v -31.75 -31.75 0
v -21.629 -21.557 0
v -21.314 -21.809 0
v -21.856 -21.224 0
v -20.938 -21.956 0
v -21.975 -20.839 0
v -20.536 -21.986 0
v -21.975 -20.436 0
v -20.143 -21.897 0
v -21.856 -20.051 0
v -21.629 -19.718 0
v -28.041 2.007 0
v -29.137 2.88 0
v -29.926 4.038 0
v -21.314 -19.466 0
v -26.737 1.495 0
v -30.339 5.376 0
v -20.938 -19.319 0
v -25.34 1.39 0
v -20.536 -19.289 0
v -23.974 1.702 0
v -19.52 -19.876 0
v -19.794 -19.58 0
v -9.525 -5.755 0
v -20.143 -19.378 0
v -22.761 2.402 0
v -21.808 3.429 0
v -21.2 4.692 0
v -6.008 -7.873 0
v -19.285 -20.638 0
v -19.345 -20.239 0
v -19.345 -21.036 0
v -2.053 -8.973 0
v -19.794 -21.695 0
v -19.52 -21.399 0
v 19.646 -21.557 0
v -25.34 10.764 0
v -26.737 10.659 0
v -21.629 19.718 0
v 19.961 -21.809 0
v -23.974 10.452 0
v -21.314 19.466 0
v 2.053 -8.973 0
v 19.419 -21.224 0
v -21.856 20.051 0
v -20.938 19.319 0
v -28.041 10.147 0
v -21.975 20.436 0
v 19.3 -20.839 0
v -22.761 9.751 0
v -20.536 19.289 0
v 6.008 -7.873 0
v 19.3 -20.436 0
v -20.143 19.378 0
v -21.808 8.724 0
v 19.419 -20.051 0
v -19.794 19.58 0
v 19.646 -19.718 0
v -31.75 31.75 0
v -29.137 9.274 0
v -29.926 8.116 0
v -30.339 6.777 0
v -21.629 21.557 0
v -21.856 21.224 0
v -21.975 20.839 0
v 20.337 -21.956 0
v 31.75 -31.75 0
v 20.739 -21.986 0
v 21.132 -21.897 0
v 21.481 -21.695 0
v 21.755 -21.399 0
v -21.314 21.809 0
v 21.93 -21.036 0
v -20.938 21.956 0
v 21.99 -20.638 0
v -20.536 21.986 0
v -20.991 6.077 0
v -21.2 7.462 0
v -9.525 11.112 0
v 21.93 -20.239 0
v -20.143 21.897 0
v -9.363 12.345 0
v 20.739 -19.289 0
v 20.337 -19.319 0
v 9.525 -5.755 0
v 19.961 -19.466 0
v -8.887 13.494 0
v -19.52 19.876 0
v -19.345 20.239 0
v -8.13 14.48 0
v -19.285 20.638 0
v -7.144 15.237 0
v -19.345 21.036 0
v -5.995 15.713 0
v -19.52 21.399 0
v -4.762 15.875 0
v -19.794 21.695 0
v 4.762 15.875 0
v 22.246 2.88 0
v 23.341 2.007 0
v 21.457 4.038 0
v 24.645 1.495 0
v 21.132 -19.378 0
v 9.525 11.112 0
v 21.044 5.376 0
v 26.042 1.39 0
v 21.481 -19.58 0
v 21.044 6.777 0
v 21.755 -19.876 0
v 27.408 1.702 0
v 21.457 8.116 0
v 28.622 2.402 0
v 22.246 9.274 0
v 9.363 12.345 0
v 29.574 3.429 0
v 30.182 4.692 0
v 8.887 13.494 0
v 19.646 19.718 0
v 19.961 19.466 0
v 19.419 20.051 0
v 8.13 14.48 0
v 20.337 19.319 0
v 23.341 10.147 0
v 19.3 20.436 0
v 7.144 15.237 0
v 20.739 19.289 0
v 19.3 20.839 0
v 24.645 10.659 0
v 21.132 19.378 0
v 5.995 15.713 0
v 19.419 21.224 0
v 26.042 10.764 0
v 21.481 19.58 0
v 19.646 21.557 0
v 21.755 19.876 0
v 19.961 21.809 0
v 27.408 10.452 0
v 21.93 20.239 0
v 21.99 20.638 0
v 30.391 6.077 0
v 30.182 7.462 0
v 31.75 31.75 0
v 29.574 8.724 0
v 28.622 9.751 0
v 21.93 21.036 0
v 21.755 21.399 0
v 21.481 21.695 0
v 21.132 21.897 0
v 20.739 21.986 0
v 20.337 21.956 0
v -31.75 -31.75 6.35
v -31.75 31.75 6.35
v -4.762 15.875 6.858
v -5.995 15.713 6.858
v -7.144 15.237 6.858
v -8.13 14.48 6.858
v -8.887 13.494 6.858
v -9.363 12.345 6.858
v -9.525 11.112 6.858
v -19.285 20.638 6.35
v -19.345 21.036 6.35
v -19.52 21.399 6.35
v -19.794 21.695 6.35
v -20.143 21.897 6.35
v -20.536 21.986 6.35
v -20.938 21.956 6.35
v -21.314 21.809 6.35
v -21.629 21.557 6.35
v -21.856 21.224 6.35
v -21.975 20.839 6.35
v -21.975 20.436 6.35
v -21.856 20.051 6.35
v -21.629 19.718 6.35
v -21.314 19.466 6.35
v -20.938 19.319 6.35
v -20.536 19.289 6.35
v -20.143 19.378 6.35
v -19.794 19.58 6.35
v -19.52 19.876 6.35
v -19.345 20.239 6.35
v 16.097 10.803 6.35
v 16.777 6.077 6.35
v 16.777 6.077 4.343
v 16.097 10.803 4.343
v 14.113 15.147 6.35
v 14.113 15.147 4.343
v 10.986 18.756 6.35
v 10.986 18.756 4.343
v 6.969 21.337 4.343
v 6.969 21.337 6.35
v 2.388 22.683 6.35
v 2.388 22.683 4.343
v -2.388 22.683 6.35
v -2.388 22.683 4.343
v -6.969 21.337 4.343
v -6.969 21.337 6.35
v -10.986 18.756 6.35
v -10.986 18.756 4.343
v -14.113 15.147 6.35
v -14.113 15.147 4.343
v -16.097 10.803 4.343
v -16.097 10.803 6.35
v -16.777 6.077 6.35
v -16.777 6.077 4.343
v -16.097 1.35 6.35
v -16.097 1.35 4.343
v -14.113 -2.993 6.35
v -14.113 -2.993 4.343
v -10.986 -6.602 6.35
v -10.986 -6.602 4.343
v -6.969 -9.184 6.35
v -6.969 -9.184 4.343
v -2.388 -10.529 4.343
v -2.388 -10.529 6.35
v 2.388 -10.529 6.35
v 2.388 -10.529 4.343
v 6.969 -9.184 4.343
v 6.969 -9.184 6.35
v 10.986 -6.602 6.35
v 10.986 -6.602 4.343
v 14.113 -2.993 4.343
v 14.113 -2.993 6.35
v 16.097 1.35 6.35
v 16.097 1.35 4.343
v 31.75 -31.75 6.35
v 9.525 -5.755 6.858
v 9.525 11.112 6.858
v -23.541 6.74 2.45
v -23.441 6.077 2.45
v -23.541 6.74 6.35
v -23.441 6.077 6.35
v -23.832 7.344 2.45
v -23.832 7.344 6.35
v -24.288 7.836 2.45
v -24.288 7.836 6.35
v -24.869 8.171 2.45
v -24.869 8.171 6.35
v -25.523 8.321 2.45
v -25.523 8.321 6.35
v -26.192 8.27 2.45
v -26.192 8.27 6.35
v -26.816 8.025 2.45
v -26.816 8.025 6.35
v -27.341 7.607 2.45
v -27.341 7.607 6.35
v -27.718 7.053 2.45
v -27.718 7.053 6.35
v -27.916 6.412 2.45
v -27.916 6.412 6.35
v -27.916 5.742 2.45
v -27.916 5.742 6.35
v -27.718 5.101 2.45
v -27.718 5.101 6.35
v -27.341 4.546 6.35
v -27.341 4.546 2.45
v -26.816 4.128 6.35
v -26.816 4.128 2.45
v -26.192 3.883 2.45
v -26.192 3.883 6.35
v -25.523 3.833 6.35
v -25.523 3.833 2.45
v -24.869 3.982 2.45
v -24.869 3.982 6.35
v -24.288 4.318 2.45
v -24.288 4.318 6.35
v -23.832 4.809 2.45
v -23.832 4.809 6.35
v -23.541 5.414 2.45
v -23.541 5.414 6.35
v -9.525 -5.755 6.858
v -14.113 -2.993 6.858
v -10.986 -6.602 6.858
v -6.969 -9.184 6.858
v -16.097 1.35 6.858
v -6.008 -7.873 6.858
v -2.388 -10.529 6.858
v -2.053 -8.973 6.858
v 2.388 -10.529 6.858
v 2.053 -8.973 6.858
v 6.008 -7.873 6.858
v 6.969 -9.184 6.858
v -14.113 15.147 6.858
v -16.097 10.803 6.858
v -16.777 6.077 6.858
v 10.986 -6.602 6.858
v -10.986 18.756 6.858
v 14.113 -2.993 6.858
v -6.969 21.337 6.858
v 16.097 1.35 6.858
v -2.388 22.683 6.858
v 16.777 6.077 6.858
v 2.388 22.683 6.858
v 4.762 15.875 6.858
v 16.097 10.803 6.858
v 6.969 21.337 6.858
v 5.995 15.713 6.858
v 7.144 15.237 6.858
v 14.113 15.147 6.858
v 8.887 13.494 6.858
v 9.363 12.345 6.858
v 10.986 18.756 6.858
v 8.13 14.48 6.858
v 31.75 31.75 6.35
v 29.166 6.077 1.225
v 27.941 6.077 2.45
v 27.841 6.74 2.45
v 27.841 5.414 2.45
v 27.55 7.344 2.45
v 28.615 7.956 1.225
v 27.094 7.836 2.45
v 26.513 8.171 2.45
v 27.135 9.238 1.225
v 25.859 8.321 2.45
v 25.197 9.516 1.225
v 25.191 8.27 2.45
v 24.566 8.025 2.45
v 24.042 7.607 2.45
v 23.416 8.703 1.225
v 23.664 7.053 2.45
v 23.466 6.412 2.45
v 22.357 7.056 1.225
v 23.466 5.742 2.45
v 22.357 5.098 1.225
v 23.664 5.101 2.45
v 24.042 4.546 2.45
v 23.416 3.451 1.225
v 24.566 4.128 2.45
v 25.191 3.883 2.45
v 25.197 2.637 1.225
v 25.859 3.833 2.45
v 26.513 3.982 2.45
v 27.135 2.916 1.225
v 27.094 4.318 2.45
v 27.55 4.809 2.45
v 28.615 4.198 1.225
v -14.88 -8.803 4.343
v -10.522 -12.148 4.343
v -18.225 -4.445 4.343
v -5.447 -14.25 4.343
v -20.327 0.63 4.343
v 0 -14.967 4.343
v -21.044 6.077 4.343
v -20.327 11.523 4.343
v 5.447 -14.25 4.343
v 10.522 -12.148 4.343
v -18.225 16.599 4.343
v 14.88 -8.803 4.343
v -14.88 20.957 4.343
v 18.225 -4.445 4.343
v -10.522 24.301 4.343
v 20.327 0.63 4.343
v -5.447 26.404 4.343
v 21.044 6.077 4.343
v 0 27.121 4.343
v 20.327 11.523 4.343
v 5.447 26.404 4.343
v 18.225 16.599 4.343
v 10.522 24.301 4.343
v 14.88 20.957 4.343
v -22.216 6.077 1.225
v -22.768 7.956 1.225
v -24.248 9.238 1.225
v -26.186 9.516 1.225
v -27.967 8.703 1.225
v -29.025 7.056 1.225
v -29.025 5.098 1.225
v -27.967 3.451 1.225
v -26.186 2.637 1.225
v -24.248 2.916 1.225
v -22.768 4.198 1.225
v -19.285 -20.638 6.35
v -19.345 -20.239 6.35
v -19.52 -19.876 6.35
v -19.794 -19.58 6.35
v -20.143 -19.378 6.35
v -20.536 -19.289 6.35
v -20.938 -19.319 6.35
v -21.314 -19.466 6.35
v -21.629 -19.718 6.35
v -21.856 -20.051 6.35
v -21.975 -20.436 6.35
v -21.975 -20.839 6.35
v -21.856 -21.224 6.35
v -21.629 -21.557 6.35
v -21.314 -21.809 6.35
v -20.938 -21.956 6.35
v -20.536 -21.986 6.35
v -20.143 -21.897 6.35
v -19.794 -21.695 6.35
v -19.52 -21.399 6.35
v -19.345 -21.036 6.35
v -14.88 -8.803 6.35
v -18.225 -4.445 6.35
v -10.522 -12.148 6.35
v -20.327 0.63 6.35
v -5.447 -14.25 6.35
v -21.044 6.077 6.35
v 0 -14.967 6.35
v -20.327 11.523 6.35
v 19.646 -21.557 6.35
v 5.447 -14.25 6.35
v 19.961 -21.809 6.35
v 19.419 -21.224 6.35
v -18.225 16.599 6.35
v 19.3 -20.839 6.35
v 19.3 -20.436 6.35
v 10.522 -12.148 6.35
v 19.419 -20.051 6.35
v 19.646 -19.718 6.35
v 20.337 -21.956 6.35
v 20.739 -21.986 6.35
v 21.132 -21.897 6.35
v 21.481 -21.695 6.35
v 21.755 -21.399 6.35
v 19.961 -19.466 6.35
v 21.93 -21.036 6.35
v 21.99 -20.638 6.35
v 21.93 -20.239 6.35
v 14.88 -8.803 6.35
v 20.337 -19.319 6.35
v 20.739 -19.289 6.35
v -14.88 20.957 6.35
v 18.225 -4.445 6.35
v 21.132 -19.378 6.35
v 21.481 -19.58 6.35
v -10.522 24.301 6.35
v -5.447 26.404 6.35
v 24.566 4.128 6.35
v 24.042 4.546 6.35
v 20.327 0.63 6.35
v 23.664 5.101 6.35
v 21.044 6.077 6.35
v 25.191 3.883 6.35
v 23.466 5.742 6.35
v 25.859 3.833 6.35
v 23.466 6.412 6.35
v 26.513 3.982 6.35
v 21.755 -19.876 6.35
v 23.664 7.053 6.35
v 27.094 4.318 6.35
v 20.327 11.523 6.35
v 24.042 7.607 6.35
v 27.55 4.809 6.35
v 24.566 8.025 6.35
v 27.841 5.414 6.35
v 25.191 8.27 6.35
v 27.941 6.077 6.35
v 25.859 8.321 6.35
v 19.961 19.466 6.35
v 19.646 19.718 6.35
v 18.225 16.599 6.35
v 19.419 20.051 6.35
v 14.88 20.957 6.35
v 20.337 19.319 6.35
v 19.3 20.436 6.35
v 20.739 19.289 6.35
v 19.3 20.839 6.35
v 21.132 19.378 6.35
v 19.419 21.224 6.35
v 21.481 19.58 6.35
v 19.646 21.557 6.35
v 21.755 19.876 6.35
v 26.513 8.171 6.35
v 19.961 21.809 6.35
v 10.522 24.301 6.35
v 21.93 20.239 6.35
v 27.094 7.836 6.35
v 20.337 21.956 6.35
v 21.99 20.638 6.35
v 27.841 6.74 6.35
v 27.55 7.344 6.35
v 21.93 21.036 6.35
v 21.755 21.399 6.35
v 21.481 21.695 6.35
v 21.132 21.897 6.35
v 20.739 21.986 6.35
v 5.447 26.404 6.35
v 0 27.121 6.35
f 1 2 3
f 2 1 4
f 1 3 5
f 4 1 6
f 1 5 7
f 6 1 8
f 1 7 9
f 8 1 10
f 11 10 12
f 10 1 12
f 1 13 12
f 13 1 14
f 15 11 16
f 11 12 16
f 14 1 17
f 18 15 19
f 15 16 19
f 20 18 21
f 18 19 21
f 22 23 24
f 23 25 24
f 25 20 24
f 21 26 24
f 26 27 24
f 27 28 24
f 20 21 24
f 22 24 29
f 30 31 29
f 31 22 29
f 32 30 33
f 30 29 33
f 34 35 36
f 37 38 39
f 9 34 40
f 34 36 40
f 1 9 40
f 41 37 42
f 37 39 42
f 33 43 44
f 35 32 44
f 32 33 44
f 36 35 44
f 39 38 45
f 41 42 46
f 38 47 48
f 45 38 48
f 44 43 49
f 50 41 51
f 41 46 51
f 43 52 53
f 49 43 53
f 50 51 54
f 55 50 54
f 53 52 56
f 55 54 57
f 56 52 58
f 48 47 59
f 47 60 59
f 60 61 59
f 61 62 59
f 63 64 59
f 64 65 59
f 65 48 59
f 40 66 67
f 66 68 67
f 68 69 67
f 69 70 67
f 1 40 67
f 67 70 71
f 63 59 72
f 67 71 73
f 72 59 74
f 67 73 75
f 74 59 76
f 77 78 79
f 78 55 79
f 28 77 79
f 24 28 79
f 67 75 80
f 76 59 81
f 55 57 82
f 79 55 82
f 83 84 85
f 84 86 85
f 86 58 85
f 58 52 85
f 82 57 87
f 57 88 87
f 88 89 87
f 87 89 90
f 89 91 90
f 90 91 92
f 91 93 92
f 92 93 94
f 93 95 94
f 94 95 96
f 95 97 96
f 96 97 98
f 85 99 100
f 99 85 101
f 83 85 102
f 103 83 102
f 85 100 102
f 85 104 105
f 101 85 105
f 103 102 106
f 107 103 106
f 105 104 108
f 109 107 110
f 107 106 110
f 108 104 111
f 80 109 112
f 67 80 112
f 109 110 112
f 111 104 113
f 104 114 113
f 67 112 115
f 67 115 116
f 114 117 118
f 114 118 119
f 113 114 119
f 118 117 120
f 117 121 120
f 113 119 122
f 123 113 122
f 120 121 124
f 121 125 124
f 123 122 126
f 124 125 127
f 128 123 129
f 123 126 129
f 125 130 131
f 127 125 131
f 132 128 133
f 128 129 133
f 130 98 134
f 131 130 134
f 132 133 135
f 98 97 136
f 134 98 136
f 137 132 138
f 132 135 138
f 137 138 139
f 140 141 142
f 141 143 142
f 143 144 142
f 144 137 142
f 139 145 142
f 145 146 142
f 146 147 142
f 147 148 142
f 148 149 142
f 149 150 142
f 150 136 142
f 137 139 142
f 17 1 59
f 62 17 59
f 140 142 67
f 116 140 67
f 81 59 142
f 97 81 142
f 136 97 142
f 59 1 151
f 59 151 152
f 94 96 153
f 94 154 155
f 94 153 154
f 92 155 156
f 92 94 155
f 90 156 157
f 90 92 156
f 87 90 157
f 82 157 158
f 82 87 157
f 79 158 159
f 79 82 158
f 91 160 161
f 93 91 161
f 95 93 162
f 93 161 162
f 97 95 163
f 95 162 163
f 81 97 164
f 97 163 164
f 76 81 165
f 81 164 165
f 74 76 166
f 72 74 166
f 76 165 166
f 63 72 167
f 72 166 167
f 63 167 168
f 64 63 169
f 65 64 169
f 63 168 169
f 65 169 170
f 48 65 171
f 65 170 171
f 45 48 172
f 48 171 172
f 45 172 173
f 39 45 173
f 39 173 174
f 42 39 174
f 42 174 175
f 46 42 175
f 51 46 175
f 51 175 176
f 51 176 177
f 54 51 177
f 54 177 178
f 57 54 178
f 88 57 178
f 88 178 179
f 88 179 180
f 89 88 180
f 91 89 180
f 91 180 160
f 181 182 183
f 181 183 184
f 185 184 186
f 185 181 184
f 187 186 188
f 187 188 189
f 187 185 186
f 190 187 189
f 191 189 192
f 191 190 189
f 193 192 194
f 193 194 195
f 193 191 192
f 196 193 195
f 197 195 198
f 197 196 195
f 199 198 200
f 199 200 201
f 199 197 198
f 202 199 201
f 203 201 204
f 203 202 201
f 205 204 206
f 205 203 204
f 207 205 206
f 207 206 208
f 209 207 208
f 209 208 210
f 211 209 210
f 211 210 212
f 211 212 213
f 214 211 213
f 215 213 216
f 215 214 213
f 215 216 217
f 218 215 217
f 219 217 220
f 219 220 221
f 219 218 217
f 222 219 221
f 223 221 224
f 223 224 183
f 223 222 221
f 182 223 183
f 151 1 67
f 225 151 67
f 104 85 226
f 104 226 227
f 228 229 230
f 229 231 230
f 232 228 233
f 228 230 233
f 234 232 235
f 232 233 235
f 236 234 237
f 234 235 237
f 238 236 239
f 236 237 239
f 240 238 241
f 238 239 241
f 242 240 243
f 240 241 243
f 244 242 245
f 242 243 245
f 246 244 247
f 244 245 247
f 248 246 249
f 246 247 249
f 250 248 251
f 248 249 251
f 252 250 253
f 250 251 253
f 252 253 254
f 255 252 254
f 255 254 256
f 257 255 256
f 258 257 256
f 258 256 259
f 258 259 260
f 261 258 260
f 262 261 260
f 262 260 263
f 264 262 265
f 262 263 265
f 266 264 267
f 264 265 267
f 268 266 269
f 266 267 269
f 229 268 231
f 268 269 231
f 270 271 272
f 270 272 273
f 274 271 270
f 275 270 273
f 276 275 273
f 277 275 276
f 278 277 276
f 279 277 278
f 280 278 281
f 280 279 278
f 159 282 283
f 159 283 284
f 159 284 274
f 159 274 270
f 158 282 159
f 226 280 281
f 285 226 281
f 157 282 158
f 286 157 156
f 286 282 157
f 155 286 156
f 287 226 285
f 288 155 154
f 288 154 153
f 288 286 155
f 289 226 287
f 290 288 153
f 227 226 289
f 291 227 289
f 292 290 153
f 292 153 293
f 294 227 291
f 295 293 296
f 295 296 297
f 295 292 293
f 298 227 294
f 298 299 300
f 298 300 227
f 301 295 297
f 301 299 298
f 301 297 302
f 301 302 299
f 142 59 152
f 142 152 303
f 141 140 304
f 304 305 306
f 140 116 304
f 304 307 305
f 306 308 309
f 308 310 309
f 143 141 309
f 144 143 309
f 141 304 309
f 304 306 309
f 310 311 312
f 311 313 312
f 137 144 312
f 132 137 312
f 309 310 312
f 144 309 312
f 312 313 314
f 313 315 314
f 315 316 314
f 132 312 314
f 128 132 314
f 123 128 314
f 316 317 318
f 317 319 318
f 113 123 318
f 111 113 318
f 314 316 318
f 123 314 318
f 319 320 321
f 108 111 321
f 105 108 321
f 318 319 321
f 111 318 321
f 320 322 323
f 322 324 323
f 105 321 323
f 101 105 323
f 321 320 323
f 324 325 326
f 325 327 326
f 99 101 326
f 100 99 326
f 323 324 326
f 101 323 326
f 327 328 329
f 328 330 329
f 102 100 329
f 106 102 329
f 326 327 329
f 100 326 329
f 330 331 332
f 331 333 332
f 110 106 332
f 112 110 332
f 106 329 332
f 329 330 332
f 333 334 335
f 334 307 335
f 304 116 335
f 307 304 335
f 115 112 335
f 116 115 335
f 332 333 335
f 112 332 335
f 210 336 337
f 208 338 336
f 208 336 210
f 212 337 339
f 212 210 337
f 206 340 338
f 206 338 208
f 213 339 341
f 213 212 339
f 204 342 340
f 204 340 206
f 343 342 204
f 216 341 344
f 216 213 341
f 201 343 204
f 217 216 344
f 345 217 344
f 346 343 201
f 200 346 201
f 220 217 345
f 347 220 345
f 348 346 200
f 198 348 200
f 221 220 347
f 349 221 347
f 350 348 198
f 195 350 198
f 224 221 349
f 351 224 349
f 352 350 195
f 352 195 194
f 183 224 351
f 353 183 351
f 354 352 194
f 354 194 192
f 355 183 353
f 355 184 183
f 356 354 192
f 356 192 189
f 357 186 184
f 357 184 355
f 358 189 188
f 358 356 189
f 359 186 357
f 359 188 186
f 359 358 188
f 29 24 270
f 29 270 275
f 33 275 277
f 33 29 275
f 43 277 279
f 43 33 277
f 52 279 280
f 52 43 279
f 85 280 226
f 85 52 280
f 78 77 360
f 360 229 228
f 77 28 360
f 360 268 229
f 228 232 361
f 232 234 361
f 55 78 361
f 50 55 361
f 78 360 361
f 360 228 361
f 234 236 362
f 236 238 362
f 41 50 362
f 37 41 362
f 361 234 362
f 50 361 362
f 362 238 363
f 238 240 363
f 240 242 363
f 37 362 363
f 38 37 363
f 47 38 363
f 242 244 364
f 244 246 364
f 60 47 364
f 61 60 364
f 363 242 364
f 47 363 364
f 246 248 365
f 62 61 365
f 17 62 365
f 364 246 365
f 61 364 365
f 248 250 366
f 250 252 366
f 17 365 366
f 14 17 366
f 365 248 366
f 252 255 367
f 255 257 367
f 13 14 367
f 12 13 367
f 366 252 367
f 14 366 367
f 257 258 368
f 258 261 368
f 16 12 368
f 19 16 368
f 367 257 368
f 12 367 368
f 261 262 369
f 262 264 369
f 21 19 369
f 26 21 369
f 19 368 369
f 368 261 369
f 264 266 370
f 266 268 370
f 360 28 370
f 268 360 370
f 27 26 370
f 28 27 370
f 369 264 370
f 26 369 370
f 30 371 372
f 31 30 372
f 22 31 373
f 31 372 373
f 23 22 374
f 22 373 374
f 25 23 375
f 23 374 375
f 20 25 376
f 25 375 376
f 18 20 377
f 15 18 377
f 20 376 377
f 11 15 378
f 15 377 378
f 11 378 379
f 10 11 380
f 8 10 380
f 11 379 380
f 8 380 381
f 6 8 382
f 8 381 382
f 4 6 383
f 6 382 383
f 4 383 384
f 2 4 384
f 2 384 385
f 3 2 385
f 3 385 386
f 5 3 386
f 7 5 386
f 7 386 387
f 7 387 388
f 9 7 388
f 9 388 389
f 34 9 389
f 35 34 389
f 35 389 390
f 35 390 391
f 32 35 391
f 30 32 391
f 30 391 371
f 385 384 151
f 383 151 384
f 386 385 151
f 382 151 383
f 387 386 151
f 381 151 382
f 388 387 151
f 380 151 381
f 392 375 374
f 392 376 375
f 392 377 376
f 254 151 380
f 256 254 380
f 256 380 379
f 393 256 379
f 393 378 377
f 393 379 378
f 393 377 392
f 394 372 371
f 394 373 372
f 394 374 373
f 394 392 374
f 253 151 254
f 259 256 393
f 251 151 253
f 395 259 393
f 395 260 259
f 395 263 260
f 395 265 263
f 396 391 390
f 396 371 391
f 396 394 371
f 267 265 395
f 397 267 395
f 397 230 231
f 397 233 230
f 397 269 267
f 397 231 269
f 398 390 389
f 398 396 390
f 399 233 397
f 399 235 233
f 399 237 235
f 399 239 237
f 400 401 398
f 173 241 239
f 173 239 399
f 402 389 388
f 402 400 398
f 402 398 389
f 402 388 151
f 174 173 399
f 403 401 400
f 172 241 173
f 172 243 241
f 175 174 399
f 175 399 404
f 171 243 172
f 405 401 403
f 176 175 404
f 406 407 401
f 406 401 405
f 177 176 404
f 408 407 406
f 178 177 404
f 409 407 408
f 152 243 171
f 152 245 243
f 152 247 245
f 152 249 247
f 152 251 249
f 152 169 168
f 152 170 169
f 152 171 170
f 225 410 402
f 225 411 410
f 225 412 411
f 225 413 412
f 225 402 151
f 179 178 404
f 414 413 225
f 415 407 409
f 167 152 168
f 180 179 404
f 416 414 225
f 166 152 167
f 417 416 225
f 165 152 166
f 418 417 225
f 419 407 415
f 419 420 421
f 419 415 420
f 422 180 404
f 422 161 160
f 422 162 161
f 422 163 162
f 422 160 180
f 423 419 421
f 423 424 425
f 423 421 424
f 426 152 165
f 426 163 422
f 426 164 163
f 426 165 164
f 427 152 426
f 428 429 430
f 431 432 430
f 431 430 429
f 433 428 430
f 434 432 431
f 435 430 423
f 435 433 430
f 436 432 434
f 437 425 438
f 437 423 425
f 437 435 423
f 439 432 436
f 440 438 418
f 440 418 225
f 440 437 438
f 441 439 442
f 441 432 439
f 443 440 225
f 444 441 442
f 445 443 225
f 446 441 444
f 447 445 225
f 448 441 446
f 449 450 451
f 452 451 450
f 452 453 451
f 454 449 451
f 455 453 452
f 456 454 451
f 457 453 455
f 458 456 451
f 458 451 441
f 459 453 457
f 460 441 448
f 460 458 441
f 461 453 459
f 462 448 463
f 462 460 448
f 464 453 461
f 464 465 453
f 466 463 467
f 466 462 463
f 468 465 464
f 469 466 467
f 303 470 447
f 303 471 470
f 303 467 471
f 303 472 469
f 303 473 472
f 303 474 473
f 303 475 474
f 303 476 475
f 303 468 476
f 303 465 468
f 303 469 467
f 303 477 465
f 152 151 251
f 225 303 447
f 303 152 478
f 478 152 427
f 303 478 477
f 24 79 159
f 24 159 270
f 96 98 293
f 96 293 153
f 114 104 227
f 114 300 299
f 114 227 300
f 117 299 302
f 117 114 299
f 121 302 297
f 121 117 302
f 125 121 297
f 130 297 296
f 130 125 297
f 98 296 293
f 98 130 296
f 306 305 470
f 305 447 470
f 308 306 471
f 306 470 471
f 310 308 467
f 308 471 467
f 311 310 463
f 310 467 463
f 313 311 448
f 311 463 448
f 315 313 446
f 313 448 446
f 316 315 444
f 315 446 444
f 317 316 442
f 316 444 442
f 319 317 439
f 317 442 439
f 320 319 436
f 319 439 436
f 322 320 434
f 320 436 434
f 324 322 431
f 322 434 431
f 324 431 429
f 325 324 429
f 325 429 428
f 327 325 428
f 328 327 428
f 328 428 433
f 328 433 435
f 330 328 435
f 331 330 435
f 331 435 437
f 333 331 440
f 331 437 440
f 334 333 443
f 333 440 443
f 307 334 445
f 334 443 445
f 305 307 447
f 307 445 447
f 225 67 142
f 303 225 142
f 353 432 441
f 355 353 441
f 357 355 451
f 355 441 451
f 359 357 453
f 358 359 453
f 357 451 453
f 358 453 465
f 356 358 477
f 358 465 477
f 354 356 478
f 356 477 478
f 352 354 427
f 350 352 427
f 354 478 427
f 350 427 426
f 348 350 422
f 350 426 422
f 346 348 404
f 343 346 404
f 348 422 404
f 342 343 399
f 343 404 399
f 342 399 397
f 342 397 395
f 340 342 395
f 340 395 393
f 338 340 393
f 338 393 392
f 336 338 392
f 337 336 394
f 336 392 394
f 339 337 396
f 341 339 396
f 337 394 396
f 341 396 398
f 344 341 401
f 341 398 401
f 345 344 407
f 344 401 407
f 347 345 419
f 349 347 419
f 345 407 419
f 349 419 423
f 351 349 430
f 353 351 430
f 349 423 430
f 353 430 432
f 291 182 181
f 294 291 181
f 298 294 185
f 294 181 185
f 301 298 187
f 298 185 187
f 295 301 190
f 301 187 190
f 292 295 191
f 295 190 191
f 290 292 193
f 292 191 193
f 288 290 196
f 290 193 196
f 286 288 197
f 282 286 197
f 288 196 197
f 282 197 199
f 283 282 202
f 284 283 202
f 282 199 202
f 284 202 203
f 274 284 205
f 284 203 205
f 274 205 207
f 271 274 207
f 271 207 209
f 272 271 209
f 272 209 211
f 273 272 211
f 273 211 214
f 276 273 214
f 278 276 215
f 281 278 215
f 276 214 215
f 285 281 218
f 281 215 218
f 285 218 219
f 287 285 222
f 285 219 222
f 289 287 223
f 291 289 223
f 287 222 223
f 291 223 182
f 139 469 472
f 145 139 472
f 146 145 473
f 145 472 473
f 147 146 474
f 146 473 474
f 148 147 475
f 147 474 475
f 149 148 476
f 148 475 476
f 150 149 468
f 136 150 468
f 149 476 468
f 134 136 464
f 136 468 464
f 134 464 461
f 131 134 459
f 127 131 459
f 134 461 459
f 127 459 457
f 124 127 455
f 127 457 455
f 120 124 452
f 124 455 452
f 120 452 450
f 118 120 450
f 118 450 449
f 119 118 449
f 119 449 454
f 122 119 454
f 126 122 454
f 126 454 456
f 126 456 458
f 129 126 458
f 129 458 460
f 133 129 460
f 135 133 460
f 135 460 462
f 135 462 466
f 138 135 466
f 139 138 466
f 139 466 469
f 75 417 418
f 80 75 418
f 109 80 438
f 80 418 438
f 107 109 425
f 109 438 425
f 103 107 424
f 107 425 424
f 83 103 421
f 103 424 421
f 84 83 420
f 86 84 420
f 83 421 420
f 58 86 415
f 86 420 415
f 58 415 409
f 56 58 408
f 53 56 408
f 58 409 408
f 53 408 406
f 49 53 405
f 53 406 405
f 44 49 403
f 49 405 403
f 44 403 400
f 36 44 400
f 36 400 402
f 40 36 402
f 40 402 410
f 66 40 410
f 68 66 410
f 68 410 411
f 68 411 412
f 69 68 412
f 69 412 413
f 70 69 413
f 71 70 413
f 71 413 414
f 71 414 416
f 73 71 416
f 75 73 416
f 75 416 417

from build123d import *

# Parameters (mm, degrees)
SKETCH1_W                                       = 63.5
SKETCH1_H                                       = 63.5
BOSS_EXTRUDE1_DEPTH                             = 6.35
F_6_32_TAPPED_HOLE1_D                           = 2.7051
SKETCH4_R                                       = 21.0439
SKETCH4_R_2                                     = 16.7767
CUT_EXTRUDE1_DEPTH                              = 2.0066
SKETCH5_R                                       = 16.7767
BOSS_EXTRUDE2_DEPTH                             = 0.508
CSK_FOR_M4_FLAT_HEAD_MACHINE_SCREW1_D           = 4.5
CSK_FOR_M4_FLAT_HEAD_MACHINE_SCREW1_CSINK_D     = 9.4
CSK_FOR_M4_FLAT_HEAD_MACHINE_SCREW1_CSINK_ANGLE = 90
CUT_EXTRUDE2_DEPTH                              = 7.858


with BuildPart() as part:
    # Sketch1 → Boss-Extrude1 (new body)
    with BuildSketch(Plane.XY):
        Rectangle(SKETCH1_W, SKETCH1_H)
    extrude(amount=BOSS_EXTRUDE1_DEPTH)

    # #6-32 Tapped Hole1 (through all)
    with Locations(Plane(origin=(0, 0, 0), x_dir=(-1, 0, 0), z_dir=(0, 0, -1))):
        with Locations((20.6375, -20.6375), (-20.6375, -20.6375), (-20.6375, 20.6375), (20.6375, 20.6375)):
            Hole(F_6_32_TAPPED_HOLE1_D / 2)

    # Sketch4 → Cut-Extrude1 (cut)
    with BuildSketch(Plane.XY.offset(6.35)):
        with Locations((0, 6.076865153)):
            Circle(SKETCH4_R)
        with Locations((0, 6.076865153)):
            Circle(SKETCH4_R_2, mode=Mode.SUBTRACT)
    extrude(amount=-CUT_EXTRUDE1_DEPTH, mode=Mode.SUBTRACT)

    # Sketch5 → Boss-Extrude2 (add)
    with BuildSketch(Plane.XY.offset(6.35)):
        with Locations((0, 6.076865153)):
            Circle(SKETCH5_R)
    extrude(amount=BOSS_EXTRUDE2_DEPTH)

    # CSK for M4 Flat Head Machine Screw1 (through all)
    with Locations(Plane(origin=(0, 0, 0), x_dir=(-1, 0, 0), z_dir=(0, 0, -1))):
        with Locations((-25.691176831, 6.076865153), (25.691176831, 6.076865153)):
            CounterSinkHole(CSK_FOR_M4_FLAT_HEAD_MACHINE_SCREW1_D / 2, CSK_FOR_M4_FLAT_HEAD_MACHINE_SCREW1_CSINK_D / 2, counter_sink_angle=CSK_FOR_M4_FLAT_HEAD_MACHINE_SCREW1_CSINK_ANGLE)

    # Sketch9 → Cut-Extrude2 (cut, through all)
    with BuildSketch(Plane(origin=(0, 0, 0), x_dir=(-1, 0, 0), z_dir=(0, 0, -1))):
        with BuildLine():
            Line((9.525, 11.1125), (9.525, -5.754710044))
            ThreePointArc((9.525, -5.754710044), (0, -9.112334847), (-9.525, -5.754710044))
            Line((-9.525, -5.754710044), (-9.525, 11.1125))
            ThreePointArc((-9.525, 11.1125), (-8.130096045, 14.480096045), (-4.7625, 15.875))
            Line((-4.7625, 15.875), (4.7625, 15.875))
            ThreePointArc((4.7625, 15.875), (8.130096045, 14.480096045), (9.525, 11.1125))
        make_face()
    extrude(amount=-CUT_EXTRUDE2_DEPTH, mode=Mode.SUBTRACT)


solid = part.part
